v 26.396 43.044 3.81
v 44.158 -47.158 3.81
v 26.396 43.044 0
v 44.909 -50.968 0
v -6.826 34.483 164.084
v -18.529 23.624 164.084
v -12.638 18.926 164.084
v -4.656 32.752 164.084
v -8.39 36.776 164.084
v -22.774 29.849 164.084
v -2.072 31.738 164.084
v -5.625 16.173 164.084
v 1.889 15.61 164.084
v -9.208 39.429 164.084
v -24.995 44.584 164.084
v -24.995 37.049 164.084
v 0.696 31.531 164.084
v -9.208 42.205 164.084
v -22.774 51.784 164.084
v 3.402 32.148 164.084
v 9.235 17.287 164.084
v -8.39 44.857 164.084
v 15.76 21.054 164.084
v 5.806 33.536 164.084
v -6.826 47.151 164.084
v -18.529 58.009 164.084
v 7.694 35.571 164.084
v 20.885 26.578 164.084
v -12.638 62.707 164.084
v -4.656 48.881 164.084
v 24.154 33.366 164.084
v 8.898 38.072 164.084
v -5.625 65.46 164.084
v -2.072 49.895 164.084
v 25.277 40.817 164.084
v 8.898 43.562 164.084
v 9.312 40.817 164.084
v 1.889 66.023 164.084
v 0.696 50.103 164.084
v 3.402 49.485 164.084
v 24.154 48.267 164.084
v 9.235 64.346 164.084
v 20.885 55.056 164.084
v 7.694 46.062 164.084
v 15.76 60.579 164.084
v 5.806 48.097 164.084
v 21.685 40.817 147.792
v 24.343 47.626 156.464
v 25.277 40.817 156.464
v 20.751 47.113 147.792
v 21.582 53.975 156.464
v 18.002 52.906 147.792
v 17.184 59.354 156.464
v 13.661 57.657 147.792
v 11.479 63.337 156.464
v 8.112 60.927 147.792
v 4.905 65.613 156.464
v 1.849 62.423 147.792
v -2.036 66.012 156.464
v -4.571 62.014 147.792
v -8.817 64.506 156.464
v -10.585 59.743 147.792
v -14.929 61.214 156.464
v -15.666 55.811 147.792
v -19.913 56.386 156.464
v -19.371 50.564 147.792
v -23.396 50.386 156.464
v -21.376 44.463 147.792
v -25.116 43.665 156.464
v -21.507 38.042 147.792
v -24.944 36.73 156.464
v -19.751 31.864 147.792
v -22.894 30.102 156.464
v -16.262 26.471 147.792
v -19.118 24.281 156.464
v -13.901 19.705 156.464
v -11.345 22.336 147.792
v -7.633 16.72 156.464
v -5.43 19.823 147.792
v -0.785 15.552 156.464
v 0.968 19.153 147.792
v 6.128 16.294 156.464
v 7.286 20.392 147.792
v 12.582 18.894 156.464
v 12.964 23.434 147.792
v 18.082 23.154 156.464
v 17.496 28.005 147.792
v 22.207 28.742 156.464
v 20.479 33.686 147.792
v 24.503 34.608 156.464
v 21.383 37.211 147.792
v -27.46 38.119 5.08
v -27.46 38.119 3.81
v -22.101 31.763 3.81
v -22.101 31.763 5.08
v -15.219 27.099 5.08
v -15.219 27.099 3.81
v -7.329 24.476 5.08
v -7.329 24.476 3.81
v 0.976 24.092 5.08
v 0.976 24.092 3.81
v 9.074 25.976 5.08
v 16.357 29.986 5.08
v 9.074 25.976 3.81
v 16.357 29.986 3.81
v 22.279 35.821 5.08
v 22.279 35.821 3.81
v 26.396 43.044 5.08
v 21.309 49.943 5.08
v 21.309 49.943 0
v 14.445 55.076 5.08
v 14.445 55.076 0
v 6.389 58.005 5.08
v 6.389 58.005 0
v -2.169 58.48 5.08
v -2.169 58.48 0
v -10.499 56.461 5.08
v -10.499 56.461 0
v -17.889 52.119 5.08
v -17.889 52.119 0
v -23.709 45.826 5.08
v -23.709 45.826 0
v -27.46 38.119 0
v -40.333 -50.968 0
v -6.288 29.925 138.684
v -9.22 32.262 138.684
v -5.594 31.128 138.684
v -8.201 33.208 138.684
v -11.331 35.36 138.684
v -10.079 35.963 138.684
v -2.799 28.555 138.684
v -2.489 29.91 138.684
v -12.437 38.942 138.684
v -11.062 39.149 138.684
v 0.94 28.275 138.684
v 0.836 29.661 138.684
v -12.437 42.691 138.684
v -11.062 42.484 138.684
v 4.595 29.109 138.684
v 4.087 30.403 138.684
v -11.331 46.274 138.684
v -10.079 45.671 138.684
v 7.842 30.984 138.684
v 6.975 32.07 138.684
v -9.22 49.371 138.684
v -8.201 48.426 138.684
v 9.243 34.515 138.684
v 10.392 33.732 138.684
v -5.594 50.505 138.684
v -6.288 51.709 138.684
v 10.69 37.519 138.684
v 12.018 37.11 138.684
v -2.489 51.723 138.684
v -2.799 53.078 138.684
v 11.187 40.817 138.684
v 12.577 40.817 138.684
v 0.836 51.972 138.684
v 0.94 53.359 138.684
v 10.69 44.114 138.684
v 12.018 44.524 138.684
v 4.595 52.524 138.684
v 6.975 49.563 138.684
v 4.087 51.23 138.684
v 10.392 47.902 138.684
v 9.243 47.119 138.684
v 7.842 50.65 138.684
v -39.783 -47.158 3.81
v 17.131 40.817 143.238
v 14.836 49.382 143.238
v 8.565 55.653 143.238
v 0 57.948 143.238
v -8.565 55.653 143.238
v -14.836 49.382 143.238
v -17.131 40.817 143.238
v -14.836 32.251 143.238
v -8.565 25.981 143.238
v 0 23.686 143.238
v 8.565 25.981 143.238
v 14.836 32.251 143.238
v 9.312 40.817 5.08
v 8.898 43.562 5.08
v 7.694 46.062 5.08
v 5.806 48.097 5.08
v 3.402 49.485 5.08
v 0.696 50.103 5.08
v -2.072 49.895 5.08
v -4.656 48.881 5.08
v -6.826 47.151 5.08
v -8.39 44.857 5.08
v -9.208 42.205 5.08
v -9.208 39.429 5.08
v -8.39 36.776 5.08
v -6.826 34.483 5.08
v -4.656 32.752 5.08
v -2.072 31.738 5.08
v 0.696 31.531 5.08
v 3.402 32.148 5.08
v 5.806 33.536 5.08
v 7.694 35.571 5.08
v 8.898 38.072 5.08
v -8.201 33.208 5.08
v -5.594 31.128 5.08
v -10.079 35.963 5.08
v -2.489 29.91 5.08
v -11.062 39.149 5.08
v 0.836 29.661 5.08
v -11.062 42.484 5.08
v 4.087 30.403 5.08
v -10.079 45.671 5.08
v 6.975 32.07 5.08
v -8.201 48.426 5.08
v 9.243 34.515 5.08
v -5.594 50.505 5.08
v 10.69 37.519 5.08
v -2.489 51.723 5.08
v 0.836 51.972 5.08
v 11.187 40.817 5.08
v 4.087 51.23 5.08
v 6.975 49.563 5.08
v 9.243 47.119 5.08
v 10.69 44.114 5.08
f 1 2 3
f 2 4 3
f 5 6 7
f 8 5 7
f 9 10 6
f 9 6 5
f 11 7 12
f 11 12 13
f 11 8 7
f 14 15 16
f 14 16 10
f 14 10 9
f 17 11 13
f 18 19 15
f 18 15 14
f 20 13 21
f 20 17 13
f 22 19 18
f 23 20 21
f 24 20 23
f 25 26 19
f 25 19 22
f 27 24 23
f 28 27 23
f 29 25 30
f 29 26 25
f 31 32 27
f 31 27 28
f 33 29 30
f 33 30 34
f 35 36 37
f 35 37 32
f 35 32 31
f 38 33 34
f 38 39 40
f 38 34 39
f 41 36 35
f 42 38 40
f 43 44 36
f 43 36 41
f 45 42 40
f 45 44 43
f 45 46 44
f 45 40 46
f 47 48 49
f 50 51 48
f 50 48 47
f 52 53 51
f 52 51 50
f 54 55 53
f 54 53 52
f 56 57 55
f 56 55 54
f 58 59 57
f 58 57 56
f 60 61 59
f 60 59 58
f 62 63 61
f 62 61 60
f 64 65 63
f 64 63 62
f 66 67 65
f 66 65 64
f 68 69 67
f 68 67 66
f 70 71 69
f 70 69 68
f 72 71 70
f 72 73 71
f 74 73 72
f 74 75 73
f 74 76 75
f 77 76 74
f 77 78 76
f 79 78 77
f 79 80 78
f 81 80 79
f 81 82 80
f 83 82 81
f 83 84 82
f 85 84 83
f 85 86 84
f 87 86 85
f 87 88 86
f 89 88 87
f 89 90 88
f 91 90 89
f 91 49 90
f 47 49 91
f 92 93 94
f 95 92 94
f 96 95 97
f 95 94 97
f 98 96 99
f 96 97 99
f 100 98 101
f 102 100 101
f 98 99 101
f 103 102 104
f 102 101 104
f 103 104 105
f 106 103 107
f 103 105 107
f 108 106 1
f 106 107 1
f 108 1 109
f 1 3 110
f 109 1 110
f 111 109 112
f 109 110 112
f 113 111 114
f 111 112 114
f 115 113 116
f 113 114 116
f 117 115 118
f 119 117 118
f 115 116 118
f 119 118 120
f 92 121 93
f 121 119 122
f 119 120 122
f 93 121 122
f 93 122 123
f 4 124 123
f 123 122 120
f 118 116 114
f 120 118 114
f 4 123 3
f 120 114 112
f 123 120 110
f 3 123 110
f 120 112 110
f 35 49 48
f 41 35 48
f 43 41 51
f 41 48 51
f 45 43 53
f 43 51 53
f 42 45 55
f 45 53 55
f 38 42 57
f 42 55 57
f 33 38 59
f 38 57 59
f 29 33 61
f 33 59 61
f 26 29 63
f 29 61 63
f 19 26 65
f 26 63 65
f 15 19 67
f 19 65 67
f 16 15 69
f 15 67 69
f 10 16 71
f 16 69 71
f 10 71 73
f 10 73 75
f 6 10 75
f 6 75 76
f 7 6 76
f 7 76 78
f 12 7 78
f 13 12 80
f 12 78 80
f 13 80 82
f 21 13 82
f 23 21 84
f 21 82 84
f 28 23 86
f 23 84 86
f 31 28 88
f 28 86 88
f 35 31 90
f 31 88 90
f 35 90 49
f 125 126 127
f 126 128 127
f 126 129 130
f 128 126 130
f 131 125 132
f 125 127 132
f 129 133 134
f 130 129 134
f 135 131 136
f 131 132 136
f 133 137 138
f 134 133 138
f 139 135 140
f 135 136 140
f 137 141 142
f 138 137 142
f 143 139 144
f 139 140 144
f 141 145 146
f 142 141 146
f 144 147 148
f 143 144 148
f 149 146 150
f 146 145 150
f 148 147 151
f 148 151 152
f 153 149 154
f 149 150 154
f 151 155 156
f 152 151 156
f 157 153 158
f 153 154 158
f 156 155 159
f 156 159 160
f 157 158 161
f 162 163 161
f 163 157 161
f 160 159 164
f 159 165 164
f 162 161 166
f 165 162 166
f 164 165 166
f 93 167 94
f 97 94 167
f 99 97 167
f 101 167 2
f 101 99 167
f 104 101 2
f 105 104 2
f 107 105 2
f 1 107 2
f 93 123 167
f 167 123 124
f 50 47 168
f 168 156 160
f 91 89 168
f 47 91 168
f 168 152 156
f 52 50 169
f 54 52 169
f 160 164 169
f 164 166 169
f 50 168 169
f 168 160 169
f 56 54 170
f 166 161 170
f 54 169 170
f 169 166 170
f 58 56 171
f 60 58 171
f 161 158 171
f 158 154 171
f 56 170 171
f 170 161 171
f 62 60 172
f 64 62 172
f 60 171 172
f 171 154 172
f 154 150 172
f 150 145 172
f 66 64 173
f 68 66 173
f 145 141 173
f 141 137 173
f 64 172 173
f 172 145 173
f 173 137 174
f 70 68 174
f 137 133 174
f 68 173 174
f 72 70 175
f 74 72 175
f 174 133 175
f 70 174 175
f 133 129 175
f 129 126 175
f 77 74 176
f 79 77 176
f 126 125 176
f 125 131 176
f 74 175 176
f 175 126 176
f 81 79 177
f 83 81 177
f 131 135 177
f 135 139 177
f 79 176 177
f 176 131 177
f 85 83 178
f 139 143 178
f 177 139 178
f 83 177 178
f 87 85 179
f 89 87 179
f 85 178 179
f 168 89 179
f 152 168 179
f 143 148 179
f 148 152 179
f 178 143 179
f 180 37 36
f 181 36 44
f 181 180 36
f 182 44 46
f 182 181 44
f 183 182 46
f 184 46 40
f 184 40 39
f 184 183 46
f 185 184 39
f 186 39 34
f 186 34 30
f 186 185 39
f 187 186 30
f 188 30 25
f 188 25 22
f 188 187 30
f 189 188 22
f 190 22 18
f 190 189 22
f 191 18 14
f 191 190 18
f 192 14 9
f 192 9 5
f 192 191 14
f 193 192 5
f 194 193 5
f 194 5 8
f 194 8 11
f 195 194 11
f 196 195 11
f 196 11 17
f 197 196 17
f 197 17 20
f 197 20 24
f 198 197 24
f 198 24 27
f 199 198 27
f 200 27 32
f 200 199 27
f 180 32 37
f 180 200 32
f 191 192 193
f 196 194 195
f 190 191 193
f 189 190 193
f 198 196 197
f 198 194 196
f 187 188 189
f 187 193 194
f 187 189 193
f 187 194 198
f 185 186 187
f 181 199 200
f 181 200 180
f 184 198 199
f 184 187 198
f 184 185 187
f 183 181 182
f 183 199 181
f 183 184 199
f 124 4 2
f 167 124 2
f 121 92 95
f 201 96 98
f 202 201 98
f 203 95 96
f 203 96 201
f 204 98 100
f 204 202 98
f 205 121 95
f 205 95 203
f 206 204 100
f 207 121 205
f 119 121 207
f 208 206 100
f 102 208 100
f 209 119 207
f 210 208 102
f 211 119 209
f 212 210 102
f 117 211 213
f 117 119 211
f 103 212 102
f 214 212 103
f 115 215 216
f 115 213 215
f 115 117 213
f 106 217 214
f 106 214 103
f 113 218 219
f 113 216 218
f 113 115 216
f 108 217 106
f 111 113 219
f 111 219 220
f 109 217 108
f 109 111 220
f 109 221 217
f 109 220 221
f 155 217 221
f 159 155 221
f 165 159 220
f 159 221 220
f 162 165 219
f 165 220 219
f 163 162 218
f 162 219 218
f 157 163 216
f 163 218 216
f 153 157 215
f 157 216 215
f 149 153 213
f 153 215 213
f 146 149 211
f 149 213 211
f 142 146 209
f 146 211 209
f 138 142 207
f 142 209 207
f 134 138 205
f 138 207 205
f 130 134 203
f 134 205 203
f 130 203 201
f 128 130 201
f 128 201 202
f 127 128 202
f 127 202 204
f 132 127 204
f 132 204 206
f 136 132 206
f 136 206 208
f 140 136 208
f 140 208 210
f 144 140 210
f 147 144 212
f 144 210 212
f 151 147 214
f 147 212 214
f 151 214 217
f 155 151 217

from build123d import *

# Parameters (mm, degrees)
F1_DEPTH    = 3.81
F3_T1_DEPTH = 111.8036914576
F4_DEPTH    = 1.27
F5_R        = 11.1870112164
F5_R_2      = 9.3121919152
F6_DEPTH    = 133.604
F7_R        = 25.2769928265
F7_R_2      = 11.1870112164
F7_R_3      = 9.3121919152
F8_DEPTH    = 25.4
F9_SIZE     = 12.7
F10_SIZE    = 5.08


# Not quite as in the source:
# - a fillet or chamfer that OpenCascade refuses, or shapes differently, is made with other operations: its cross-section is extruded or revolved along the edge and cut away or added


with BuildPart() as f1:
    # F0 (on Top) → F1 (new body)
    with BuildSketch(Plane.XY):
        with BuildLine():
            Line((45.1586060226, -52.2380582988), (26.3960231096, 43.0443435907))
            ThreePointArc((26.3960231096, 43.0443435907), (-2.1687844347, 58.4802777375), (-27.4601764977, 38.1194874644))
            Line((-27.4601764977, 38.1194874644), (-40.5167862773, -52.2380582988))
            Line((-40.5167862773, -52.2380582988), (45.1586060226, -52.2380582988))
        make_face()
    extrude(amount=F1_DEPTH)

    # F3: chamfer of 5.08 on 1 edges, made by hand

    # F3_s2 → F3_t1 (cut)
    with BuildSketch(Plane.YZ.offset(-53.5809358562)):
        Polygon((-52.2380582988, -1.27), (-47.1580582988, 3.81), (-52.2380582988, 3.81), align=None)
    extrude(amount=F3_T1_DEPTH, mode=Mode.SUBTRACT)

    # F2 (on face) → F4 (join)
    with BuildSketch(Plane.XY.offset(3.81)):
        with BuildLine():
            ThreePointArc((26.3960231096, 43.0443435907), (-2.1687844347, 58.4802777375), (-27.4601764977, 38.1194874644))
            ThreePointArc((-27.4601764977, 38.1194874644), (0.9757940306, 24.0924618975), (26.3960231096, 43.0443435907))
        make_face()
    extrude(amount=F4_DEPTH)

    # F5 (on face) → F6 (join)
    with BuildSketch(Plane.XY.offset(5.08)):
        with Locations((0, 40.8166870475)):
            Circle(F5_R)
        with Locations((0, 40.8166870475)):
            Circle(F5_R_2, mode=Mode.SUBTRACT)
    extrude(amount=F6_DEPTH)

    # F7 (on face) → F8 (join)
    with BuildSketch(Plane.XY.offset(138.684)):
        with Locations((0, 40.8166870475)):
            Circle(F7_R)
        with Locations((0, 40.8166870475)):
            Circle(F7_R_2, mode=Mode.SUBTRACT)
        with Locations((0, 40.8166870475)):
            Circle(F7_R_2)
        with Locations((0, 40.8166870475)):
            Circle(F7_R_3, mode=Mode.SUBTRACT)
    extrude(amount=F8_DEPTH)

    # F9
    f9_edges = [f1.edges().sort_by_distance(p)[0] for p in [
        (-25.276993, 40.816687, 138.684),
    ]]
    chamfer(f9_edges, length=F9_SIZE)

    # F10
    f10_edges = [f1.edges().sort_by_distance(p)[0] for p in [
        (-25.276993, 40.816687, 151.384),
    ]]
    chamfer(f10_edges, length=F10_SIZE)


solid = f1.part
